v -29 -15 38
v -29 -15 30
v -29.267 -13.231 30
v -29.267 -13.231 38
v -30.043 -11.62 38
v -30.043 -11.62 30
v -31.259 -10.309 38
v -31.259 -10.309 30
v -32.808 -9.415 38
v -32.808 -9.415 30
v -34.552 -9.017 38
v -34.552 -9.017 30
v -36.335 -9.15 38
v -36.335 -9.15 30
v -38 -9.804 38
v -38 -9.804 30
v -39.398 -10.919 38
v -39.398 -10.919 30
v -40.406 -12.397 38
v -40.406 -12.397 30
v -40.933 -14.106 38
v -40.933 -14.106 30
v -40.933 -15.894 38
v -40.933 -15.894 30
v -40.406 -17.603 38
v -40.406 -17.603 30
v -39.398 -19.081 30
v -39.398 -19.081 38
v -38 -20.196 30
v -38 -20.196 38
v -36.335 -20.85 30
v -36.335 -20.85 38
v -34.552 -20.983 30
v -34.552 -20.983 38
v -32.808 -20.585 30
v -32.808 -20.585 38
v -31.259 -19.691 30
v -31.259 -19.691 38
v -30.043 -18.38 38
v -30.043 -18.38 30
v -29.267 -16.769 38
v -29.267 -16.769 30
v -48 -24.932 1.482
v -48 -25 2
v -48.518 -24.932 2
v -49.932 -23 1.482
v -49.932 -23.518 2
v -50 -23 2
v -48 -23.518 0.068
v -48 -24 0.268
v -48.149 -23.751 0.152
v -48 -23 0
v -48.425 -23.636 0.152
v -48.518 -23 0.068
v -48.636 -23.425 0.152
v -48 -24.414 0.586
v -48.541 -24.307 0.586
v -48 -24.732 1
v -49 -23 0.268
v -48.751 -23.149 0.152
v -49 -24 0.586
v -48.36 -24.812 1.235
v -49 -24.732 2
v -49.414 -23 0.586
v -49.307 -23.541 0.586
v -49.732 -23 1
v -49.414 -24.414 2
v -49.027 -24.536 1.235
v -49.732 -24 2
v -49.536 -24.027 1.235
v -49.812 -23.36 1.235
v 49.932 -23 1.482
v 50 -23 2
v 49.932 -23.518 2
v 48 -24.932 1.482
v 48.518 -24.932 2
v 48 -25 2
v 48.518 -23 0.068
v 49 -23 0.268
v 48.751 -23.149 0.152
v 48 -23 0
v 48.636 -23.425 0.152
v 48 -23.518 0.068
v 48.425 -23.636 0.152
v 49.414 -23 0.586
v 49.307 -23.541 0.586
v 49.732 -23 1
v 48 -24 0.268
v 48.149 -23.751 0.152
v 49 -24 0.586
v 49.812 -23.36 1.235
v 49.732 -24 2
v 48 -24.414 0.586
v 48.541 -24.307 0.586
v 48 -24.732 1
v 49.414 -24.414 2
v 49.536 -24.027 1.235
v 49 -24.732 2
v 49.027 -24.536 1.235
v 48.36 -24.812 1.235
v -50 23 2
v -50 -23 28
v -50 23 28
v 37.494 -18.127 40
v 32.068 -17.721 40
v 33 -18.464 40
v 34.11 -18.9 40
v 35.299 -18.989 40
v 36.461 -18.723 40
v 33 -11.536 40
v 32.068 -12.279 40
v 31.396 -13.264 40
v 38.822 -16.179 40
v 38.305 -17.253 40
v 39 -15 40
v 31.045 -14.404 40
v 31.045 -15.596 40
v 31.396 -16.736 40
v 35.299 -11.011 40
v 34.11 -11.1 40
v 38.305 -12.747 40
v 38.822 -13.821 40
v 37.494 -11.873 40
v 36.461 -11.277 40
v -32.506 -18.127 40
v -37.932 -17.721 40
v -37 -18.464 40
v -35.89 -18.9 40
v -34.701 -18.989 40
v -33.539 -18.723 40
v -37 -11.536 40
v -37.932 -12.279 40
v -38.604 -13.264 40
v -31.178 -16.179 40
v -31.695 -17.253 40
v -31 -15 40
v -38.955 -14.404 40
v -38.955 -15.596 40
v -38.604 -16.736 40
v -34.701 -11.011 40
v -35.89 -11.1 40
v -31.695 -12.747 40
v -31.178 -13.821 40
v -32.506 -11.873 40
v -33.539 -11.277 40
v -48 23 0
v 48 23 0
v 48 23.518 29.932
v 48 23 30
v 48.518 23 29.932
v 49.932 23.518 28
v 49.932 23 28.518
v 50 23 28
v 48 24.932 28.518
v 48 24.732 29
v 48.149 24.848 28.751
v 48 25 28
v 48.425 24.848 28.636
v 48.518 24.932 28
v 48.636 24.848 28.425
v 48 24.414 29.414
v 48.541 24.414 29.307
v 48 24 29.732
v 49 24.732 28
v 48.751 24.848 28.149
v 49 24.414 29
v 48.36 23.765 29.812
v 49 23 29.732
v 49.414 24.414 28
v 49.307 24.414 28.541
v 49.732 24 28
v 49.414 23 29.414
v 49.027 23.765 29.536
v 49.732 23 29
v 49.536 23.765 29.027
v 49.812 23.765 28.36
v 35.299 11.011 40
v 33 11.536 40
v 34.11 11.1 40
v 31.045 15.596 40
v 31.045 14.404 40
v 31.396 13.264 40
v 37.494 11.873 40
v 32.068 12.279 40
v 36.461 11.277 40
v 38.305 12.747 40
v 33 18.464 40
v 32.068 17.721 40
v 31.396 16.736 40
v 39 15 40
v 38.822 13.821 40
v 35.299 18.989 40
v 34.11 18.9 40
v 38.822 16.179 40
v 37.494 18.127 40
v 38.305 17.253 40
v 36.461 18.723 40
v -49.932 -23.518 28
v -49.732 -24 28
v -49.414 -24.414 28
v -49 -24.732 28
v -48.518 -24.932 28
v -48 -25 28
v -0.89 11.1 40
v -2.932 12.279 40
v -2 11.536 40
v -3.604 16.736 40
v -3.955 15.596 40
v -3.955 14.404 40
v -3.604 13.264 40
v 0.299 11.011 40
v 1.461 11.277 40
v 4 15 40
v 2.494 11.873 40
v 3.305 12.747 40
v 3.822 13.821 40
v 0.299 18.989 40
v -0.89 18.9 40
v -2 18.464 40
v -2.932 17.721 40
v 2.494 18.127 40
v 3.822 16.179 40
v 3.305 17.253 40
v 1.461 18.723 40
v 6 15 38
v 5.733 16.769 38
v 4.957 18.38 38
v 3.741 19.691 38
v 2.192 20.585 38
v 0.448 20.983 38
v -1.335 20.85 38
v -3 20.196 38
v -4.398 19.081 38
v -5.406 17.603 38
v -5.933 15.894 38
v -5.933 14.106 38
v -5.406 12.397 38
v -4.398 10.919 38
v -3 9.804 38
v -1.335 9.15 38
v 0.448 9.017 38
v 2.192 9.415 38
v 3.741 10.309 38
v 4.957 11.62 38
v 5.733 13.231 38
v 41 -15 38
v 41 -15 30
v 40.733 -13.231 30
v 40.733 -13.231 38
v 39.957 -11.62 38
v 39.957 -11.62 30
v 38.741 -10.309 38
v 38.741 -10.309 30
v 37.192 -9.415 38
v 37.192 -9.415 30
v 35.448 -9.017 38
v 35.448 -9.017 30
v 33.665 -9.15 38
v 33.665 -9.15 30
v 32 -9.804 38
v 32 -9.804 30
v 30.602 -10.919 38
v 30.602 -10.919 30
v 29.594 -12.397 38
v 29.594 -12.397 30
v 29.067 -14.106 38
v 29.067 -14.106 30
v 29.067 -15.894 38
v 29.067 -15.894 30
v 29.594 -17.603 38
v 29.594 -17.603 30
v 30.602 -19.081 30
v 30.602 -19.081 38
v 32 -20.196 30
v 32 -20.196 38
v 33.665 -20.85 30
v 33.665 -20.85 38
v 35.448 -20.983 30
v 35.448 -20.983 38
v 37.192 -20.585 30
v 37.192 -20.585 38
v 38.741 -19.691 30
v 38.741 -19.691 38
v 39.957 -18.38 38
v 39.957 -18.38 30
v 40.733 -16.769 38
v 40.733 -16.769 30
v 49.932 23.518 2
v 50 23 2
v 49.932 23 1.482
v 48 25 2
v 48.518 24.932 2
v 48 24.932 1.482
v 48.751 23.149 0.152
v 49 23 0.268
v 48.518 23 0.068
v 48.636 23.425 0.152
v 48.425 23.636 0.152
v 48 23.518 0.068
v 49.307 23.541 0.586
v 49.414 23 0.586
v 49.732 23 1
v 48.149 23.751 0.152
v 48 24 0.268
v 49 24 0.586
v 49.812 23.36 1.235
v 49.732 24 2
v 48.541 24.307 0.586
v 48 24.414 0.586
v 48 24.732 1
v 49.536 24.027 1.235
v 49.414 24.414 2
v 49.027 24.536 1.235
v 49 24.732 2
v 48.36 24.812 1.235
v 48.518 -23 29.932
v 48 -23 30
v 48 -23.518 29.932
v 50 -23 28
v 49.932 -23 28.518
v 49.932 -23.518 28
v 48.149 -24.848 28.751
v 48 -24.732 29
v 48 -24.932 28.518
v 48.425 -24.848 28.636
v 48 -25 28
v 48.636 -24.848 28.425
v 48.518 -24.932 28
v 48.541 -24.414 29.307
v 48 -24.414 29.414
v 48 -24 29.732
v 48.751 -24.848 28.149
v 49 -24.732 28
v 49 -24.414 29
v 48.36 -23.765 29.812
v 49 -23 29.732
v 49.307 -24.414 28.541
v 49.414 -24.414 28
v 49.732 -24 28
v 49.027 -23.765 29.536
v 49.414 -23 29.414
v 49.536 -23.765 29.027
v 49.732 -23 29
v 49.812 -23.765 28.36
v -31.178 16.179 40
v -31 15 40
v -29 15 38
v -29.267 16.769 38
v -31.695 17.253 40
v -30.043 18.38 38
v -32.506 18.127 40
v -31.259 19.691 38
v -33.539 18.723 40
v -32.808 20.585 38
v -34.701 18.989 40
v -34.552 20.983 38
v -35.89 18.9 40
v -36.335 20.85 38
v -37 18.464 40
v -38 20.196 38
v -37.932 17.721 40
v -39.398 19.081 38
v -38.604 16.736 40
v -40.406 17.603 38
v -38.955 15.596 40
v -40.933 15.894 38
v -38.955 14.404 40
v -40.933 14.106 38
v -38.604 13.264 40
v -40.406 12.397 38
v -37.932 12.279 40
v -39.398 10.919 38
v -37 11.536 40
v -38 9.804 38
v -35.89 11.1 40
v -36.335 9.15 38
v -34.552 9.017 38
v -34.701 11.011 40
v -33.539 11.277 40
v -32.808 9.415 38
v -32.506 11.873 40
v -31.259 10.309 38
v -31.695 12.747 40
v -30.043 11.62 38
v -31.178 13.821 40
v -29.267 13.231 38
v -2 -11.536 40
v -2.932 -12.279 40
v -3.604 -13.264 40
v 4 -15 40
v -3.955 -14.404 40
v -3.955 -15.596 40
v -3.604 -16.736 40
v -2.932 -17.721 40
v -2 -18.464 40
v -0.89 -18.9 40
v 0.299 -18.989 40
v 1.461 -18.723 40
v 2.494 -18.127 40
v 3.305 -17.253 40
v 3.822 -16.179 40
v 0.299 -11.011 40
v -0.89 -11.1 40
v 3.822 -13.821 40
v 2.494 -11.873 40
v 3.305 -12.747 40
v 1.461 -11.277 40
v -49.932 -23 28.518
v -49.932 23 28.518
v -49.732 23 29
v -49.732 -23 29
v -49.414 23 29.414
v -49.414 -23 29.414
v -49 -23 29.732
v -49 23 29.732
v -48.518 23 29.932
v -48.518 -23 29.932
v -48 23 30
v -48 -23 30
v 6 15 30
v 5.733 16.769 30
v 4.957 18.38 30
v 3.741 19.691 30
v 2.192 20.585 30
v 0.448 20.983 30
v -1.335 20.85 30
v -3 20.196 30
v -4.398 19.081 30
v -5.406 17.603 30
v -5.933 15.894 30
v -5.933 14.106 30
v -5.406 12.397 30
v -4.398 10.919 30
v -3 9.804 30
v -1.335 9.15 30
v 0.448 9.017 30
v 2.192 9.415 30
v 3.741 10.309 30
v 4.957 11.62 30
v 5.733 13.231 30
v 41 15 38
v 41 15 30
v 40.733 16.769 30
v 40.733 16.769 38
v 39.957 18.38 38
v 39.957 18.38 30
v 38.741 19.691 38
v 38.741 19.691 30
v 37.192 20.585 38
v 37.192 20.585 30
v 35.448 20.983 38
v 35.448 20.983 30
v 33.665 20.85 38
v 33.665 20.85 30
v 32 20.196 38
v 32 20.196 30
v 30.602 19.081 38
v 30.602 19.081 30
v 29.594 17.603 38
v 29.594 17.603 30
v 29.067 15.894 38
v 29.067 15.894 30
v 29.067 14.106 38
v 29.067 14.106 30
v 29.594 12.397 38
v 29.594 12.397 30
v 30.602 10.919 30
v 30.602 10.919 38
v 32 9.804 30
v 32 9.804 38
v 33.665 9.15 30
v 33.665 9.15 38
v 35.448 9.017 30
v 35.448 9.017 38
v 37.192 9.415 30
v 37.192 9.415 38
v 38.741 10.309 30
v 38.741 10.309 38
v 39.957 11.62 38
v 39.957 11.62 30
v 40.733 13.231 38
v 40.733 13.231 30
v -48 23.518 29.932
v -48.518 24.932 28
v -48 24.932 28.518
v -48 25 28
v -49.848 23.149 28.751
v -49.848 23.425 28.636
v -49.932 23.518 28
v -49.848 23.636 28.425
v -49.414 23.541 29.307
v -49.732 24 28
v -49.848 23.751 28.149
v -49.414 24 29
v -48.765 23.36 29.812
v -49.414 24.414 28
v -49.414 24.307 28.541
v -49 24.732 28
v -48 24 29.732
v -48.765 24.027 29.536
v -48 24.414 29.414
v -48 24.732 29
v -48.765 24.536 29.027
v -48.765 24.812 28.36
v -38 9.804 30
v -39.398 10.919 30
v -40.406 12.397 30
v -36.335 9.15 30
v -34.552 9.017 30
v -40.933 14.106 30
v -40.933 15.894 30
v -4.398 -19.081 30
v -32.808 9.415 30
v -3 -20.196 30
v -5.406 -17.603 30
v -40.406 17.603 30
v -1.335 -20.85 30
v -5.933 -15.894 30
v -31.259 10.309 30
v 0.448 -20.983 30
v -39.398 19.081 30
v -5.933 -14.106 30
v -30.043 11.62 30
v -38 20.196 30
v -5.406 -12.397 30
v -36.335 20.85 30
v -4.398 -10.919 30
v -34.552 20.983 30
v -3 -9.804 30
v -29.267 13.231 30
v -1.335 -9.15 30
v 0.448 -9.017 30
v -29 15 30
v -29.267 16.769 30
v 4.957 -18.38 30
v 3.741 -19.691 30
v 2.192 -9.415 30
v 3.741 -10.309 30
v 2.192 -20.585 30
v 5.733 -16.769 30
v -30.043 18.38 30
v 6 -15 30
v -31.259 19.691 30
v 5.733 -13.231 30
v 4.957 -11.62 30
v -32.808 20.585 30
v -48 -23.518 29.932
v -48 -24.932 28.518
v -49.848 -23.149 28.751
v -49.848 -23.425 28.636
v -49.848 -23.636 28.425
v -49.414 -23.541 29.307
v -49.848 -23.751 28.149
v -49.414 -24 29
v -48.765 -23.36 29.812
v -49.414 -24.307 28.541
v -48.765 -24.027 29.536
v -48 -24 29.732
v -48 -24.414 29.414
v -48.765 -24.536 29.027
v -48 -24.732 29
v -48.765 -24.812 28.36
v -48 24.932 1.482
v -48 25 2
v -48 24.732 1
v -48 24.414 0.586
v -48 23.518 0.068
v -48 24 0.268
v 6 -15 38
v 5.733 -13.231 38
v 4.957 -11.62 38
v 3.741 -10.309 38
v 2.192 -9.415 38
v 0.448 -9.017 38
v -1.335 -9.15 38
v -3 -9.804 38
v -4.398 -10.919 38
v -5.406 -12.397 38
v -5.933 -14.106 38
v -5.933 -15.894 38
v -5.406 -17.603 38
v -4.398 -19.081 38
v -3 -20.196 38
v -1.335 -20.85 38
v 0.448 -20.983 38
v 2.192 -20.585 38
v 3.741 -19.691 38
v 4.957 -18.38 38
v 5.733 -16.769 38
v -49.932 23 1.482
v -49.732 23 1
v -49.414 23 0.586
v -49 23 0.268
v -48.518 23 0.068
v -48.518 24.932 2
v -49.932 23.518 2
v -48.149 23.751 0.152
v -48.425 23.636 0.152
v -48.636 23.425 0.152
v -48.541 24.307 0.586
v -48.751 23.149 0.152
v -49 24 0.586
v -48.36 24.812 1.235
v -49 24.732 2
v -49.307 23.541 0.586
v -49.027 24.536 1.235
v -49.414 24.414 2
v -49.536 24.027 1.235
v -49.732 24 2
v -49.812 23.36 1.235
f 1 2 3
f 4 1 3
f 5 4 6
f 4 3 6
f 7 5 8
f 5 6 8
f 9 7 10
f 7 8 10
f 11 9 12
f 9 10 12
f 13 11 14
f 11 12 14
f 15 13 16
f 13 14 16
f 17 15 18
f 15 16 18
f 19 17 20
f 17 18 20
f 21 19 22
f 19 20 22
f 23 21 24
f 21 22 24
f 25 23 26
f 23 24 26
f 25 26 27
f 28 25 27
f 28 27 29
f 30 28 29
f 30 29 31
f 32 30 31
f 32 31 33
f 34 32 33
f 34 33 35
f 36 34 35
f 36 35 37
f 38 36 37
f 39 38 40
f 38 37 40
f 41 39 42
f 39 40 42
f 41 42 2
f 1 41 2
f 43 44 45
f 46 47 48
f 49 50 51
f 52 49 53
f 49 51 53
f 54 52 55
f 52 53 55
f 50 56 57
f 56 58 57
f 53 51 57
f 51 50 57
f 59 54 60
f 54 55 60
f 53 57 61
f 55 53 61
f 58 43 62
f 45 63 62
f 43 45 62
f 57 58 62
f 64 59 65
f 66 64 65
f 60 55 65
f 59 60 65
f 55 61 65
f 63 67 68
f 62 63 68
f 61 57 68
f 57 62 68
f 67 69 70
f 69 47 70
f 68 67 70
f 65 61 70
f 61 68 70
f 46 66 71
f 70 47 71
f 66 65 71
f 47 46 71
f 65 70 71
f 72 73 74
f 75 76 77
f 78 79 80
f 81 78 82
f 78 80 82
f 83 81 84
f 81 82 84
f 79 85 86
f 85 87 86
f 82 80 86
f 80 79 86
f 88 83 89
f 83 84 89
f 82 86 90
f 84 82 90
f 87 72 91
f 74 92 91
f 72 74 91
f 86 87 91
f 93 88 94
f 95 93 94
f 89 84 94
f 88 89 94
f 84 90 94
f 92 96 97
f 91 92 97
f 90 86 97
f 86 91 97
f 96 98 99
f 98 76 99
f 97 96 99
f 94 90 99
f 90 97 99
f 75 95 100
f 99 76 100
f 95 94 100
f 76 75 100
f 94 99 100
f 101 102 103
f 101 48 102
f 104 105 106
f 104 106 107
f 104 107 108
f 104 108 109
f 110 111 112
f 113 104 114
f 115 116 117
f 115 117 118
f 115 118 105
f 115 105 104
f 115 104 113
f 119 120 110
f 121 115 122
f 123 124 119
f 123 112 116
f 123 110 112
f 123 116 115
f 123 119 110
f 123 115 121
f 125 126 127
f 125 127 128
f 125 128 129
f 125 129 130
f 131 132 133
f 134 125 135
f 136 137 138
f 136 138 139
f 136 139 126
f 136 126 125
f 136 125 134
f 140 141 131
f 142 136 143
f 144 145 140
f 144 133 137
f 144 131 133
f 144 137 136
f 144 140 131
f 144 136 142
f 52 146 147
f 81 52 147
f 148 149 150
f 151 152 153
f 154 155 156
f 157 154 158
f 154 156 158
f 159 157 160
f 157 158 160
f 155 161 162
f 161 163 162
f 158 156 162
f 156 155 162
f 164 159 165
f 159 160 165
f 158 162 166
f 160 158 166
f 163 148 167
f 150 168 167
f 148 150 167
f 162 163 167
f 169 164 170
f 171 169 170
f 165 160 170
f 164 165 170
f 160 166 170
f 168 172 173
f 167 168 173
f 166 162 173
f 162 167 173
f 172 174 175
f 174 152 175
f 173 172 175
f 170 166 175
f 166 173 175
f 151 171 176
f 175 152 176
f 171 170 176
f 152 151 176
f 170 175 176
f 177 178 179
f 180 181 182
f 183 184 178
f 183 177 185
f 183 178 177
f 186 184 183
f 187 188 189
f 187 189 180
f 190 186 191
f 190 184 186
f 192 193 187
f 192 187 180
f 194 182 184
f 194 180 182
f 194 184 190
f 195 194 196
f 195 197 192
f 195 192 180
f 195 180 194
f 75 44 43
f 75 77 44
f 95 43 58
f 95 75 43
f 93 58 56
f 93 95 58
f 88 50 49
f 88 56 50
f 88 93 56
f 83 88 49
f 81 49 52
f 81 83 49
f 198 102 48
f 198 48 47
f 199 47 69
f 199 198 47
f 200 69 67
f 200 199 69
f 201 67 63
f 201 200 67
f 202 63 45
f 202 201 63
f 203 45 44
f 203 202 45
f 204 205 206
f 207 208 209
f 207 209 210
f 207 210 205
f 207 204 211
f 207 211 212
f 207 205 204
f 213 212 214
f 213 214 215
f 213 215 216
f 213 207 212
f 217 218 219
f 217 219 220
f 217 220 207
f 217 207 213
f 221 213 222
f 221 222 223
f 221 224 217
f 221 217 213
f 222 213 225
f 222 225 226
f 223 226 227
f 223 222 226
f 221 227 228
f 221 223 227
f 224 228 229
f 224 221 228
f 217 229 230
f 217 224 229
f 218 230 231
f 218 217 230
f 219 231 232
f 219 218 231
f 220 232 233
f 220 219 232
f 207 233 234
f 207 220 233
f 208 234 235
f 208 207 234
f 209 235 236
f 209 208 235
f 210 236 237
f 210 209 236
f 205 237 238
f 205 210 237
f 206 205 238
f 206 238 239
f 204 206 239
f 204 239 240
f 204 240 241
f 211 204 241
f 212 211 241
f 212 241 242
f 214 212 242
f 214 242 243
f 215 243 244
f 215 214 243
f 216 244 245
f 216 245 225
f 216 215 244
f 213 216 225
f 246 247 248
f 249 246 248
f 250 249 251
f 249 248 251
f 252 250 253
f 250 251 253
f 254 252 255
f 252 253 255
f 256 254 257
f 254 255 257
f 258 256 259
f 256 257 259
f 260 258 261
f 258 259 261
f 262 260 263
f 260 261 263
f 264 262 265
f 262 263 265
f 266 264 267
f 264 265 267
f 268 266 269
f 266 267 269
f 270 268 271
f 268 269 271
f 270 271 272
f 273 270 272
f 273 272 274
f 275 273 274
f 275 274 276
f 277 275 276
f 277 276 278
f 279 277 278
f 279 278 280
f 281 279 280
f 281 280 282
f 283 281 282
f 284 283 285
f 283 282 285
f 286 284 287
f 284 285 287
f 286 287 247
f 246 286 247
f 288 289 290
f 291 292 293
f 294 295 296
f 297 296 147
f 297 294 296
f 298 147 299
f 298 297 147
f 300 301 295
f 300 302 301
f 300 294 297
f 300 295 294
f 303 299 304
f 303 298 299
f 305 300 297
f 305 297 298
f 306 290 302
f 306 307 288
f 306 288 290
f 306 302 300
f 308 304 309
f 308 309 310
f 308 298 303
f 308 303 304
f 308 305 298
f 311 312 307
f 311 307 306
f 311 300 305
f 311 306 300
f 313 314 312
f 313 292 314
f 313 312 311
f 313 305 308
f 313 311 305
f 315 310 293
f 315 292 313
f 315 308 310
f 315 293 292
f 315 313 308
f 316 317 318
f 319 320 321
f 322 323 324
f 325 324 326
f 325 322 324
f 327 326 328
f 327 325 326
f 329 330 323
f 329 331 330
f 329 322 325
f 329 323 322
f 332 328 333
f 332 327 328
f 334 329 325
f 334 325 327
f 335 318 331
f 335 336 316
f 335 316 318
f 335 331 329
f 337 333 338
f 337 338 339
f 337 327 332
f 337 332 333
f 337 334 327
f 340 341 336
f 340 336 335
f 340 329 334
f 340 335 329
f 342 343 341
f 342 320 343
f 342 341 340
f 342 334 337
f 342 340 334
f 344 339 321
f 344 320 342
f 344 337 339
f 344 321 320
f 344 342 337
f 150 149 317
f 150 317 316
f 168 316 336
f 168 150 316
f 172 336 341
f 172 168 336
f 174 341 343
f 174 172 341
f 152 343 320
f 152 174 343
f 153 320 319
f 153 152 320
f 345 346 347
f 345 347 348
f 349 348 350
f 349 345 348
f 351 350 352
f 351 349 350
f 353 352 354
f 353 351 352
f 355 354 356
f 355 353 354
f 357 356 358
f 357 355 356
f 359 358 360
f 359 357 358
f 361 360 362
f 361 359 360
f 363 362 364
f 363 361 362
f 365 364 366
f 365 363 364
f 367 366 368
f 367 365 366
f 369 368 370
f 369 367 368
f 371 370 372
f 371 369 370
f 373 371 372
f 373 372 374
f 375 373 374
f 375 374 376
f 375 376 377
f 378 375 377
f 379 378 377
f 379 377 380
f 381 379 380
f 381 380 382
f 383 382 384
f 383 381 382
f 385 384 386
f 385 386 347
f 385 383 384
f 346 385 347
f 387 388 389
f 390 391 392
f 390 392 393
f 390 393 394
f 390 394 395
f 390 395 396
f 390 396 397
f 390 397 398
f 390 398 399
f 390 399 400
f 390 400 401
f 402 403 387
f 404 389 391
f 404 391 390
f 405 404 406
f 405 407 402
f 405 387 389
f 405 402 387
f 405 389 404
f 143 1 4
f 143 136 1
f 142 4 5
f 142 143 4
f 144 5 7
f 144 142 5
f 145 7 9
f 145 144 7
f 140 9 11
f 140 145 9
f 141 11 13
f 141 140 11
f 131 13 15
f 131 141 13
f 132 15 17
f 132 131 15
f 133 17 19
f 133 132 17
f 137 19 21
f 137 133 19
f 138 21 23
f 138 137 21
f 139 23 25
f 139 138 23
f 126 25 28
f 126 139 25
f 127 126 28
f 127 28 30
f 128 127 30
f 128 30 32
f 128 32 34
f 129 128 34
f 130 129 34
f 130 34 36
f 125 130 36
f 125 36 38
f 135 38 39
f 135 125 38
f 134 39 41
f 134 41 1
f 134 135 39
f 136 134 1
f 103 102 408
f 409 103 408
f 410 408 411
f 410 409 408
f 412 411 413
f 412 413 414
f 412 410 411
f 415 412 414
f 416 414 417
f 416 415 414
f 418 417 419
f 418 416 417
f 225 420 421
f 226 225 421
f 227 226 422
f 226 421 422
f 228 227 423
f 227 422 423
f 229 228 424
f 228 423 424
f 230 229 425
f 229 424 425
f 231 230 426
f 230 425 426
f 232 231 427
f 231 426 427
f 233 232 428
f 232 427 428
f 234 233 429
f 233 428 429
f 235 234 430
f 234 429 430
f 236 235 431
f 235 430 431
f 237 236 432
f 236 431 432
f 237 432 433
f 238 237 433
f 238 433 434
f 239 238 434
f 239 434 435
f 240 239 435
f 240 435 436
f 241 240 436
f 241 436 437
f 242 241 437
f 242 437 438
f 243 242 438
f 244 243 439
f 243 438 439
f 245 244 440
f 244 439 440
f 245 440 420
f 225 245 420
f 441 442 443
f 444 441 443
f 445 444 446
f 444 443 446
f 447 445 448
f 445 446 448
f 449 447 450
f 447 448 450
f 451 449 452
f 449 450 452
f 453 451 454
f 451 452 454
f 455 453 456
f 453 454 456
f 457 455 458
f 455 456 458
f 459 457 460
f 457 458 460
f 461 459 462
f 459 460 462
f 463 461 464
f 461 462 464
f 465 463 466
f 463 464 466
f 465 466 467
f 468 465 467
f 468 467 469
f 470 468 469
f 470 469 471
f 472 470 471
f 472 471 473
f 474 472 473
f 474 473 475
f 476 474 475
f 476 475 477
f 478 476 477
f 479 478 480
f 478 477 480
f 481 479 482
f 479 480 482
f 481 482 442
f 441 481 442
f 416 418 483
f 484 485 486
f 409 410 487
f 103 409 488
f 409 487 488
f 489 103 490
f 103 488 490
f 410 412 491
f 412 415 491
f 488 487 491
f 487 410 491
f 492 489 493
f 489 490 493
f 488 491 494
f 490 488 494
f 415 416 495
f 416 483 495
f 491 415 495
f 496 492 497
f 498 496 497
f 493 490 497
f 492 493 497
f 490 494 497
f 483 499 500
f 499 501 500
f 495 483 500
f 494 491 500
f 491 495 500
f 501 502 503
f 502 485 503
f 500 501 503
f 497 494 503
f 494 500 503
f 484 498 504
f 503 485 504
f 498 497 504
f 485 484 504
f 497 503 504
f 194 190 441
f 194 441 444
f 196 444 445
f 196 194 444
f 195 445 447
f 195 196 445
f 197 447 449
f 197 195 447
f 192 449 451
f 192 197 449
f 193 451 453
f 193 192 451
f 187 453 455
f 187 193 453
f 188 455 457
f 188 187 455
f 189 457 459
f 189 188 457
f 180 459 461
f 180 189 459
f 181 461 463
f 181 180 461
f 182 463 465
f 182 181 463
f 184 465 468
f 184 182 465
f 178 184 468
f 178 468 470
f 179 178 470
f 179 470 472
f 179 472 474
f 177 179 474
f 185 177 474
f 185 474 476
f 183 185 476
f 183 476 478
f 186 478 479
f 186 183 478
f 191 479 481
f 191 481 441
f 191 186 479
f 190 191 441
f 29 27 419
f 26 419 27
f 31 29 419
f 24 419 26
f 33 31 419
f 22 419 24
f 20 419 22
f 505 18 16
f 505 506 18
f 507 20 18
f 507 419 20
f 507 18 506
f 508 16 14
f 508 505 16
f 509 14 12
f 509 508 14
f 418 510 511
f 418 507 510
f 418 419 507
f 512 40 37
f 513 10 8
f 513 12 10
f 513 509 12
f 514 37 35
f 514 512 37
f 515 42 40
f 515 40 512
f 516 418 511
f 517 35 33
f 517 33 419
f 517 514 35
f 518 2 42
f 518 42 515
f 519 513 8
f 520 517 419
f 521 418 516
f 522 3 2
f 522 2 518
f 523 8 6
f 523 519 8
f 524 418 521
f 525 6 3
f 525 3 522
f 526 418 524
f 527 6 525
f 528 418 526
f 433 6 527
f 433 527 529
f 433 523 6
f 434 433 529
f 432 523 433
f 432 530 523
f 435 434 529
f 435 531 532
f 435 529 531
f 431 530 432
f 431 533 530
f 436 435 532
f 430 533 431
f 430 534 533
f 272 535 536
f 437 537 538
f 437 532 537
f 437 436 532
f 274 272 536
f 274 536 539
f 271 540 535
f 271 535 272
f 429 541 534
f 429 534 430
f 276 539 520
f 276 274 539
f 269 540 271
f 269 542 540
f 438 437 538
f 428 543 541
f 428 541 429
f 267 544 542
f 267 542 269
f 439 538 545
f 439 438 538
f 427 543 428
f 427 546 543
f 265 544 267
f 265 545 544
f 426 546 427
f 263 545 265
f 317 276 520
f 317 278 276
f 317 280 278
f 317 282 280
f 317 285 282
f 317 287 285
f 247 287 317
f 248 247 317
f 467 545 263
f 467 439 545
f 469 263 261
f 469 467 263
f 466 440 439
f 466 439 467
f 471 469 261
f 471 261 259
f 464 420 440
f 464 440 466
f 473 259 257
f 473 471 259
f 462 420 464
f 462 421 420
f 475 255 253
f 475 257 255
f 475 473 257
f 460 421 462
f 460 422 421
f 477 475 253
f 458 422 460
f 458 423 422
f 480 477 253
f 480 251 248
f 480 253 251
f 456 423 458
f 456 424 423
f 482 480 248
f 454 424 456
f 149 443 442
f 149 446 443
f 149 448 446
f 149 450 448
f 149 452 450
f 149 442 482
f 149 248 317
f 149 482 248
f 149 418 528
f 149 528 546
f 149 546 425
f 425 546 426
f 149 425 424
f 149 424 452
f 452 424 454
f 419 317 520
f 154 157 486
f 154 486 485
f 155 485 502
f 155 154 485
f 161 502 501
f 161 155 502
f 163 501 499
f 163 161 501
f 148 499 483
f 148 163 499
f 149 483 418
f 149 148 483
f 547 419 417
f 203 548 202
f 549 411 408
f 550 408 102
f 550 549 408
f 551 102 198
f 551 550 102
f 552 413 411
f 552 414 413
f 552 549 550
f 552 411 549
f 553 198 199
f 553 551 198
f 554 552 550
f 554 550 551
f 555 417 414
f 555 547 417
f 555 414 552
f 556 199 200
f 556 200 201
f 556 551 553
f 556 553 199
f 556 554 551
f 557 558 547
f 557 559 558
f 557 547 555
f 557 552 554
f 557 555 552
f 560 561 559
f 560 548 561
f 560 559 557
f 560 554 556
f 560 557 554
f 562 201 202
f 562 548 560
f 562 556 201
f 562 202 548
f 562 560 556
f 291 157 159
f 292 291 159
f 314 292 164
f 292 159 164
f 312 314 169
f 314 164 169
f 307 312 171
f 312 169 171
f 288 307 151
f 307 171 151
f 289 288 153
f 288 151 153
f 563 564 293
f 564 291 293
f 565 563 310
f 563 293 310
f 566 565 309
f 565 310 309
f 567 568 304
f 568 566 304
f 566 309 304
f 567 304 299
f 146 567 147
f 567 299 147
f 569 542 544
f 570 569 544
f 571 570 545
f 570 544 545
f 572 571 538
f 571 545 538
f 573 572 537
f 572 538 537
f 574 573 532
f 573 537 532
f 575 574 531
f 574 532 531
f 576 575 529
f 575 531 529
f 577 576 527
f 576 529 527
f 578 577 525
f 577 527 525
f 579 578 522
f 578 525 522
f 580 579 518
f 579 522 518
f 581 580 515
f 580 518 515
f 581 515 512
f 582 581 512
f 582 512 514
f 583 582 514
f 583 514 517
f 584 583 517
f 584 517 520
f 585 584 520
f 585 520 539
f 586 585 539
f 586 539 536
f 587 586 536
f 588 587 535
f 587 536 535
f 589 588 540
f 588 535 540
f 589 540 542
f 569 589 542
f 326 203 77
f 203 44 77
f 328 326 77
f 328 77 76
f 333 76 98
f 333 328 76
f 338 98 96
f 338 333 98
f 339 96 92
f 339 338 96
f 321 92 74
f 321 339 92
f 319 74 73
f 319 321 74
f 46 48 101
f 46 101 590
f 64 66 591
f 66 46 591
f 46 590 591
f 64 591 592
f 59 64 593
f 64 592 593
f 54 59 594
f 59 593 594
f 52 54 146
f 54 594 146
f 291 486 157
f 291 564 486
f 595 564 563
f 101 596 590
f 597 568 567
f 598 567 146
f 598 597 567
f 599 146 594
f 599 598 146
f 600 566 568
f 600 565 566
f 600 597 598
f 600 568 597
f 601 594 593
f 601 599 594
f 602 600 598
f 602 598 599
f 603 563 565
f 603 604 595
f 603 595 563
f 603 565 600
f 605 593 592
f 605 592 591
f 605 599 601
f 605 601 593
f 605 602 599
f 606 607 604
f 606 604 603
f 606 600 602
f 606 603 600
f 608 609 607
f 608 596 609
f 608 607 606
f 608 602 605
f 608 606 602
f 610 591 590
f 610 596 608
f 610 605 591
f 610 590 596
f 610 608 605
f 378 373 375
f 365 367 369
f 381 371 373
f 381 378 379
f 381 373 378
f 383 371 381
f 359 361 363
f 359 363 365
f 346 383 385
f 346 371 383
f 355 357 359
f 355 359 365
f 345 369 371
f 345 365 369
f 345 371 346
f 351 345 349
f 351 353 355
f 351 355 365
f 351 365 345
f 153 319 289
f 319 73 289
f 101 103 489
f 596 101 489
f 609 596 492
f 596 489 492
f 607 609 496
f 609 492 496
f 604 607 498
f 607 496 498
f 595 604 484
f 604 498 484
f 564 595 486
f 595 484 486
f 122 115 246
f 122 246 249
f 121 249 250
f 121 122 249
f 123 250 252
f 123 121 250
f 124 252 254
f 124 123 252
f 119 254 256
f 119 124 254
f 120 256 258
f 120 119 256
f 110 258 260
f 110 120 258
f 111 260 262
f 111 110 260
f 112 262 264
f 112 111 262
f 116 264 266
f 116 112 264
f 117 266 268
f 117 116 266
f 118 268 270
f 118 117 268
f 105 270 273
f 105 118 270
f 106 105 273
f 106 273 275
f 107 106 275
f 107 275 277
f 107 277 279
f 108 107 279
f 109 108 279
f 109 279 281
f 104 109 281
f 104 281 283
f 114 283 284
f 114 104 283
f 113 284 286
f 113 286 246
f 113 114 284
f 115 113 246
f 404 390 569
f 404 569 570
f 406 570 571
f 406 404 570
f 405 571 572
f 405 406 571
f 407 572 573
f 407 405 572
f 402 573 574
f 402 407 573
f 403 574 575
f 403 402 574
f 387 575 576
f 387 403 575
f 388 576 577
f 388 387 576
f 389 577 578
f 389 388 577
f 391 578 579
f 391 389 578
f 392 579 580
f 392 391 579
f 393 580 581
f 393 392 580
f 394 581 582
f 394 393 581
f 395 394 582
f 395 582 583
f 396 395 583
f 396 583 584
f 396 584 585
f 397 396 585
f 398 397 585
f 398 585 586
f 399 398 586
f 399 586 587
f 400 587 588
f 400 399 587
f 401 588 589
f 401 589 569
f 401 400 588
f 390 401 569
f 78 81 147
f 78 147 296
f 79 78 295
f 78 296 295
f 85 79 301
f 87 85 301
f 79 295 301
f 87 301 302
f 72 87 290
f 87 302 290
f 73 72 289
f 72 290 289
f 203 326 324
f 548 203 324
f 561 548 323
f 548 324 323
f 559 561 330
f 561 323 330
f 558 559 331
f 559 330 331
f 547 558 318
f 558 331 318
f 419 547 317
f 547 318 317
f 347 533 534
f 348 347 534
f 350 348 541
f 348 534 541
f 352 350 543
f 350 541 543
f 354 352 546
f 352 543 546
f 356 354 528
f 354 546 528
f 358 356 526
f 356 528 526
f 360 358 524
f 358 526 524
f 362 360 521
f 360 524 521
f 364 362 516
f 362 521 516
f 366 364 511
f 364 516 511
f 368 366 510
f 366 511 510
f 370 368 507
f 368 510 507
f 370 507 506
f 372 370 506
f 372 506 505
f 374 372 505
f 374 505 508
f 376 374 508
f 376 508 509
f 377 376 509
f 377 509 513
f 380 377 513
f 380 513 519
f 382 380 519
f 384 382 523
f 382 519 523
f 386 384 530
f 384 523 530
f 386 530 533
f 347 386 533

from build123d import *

# Parameters (mm, degrees)
F0_W      = 100
F0_H      = 50
F1_DEPTH  = 30
F2_R      = 6
F3_DEPTH  = 10
F4_R      = 2
F5_SIZE   = 2
F3_FACE_R = 4
F6_DEPTH  = 5


with BuildPart() as f1:
    # F0 (on Top) → F1 (new body)
    with BuildSketch(Plane.XY):
        Rectangle(F0_W, F0_H)
    extrude(amount=F1_DEPTH)

    # F2 (on face) → F3 (join)
    with BuildSketch(Plane.XY.offset(30)):
        with Locations((35, 15)):
            Circle(F2_R)
        with Locations((35, -15)):
            Circle(F2_R)
        with Locations((0, -15)):
            Circle(F2_R)
        with Locations((0, 15)):
            Circle(F2_R)
        with Locations((-35, 15)):
            Circle(F2_R)
        with Locations((-35, -15)):
            Circle(F2_R)
    extrude(amount=F3_DEPTH)

    # F4
    f4_edges = [f1.edges().sort_by_distance(p)[0] for p in [
        (50, 0, 30),
        (0, -25, 30),
        (0, 25, 30),
        (-50, 0, 30),
        (50, -25, 15),
        (50, 25, 15),
        (50, 0, 0),
        (-50, -25, 15),
        (0, -25, 0),
        (-50, 25, 15),
        (0, 25, 0),
        (-50, 0, 0),
    ]]
    fillet(f4_edges, radius=F4_R)

    # F5
    f5_edges = [f1.edges().sort_by_distance(p)[0] for p in [
        (-41, 15, 40),
        (-41, -15, 40),
        (-6, -15, 40),
        (-6, 15, 40),
        (29, 15, 40),
        (29, -15, 40),
    ]]
    chamfer(f5_edges, length=F5_SIZE)

    # F3_face (on face) → F6 (join)
    with BuildSketch(Plane(origin=(-35, -15, 40), x_dir=(1, 0, 0), z_dir=(0, 0, 1))):
        Circle(F3_FACE_R)
    extrude(amount=-F6_DEPTH)


solid = f1.part
